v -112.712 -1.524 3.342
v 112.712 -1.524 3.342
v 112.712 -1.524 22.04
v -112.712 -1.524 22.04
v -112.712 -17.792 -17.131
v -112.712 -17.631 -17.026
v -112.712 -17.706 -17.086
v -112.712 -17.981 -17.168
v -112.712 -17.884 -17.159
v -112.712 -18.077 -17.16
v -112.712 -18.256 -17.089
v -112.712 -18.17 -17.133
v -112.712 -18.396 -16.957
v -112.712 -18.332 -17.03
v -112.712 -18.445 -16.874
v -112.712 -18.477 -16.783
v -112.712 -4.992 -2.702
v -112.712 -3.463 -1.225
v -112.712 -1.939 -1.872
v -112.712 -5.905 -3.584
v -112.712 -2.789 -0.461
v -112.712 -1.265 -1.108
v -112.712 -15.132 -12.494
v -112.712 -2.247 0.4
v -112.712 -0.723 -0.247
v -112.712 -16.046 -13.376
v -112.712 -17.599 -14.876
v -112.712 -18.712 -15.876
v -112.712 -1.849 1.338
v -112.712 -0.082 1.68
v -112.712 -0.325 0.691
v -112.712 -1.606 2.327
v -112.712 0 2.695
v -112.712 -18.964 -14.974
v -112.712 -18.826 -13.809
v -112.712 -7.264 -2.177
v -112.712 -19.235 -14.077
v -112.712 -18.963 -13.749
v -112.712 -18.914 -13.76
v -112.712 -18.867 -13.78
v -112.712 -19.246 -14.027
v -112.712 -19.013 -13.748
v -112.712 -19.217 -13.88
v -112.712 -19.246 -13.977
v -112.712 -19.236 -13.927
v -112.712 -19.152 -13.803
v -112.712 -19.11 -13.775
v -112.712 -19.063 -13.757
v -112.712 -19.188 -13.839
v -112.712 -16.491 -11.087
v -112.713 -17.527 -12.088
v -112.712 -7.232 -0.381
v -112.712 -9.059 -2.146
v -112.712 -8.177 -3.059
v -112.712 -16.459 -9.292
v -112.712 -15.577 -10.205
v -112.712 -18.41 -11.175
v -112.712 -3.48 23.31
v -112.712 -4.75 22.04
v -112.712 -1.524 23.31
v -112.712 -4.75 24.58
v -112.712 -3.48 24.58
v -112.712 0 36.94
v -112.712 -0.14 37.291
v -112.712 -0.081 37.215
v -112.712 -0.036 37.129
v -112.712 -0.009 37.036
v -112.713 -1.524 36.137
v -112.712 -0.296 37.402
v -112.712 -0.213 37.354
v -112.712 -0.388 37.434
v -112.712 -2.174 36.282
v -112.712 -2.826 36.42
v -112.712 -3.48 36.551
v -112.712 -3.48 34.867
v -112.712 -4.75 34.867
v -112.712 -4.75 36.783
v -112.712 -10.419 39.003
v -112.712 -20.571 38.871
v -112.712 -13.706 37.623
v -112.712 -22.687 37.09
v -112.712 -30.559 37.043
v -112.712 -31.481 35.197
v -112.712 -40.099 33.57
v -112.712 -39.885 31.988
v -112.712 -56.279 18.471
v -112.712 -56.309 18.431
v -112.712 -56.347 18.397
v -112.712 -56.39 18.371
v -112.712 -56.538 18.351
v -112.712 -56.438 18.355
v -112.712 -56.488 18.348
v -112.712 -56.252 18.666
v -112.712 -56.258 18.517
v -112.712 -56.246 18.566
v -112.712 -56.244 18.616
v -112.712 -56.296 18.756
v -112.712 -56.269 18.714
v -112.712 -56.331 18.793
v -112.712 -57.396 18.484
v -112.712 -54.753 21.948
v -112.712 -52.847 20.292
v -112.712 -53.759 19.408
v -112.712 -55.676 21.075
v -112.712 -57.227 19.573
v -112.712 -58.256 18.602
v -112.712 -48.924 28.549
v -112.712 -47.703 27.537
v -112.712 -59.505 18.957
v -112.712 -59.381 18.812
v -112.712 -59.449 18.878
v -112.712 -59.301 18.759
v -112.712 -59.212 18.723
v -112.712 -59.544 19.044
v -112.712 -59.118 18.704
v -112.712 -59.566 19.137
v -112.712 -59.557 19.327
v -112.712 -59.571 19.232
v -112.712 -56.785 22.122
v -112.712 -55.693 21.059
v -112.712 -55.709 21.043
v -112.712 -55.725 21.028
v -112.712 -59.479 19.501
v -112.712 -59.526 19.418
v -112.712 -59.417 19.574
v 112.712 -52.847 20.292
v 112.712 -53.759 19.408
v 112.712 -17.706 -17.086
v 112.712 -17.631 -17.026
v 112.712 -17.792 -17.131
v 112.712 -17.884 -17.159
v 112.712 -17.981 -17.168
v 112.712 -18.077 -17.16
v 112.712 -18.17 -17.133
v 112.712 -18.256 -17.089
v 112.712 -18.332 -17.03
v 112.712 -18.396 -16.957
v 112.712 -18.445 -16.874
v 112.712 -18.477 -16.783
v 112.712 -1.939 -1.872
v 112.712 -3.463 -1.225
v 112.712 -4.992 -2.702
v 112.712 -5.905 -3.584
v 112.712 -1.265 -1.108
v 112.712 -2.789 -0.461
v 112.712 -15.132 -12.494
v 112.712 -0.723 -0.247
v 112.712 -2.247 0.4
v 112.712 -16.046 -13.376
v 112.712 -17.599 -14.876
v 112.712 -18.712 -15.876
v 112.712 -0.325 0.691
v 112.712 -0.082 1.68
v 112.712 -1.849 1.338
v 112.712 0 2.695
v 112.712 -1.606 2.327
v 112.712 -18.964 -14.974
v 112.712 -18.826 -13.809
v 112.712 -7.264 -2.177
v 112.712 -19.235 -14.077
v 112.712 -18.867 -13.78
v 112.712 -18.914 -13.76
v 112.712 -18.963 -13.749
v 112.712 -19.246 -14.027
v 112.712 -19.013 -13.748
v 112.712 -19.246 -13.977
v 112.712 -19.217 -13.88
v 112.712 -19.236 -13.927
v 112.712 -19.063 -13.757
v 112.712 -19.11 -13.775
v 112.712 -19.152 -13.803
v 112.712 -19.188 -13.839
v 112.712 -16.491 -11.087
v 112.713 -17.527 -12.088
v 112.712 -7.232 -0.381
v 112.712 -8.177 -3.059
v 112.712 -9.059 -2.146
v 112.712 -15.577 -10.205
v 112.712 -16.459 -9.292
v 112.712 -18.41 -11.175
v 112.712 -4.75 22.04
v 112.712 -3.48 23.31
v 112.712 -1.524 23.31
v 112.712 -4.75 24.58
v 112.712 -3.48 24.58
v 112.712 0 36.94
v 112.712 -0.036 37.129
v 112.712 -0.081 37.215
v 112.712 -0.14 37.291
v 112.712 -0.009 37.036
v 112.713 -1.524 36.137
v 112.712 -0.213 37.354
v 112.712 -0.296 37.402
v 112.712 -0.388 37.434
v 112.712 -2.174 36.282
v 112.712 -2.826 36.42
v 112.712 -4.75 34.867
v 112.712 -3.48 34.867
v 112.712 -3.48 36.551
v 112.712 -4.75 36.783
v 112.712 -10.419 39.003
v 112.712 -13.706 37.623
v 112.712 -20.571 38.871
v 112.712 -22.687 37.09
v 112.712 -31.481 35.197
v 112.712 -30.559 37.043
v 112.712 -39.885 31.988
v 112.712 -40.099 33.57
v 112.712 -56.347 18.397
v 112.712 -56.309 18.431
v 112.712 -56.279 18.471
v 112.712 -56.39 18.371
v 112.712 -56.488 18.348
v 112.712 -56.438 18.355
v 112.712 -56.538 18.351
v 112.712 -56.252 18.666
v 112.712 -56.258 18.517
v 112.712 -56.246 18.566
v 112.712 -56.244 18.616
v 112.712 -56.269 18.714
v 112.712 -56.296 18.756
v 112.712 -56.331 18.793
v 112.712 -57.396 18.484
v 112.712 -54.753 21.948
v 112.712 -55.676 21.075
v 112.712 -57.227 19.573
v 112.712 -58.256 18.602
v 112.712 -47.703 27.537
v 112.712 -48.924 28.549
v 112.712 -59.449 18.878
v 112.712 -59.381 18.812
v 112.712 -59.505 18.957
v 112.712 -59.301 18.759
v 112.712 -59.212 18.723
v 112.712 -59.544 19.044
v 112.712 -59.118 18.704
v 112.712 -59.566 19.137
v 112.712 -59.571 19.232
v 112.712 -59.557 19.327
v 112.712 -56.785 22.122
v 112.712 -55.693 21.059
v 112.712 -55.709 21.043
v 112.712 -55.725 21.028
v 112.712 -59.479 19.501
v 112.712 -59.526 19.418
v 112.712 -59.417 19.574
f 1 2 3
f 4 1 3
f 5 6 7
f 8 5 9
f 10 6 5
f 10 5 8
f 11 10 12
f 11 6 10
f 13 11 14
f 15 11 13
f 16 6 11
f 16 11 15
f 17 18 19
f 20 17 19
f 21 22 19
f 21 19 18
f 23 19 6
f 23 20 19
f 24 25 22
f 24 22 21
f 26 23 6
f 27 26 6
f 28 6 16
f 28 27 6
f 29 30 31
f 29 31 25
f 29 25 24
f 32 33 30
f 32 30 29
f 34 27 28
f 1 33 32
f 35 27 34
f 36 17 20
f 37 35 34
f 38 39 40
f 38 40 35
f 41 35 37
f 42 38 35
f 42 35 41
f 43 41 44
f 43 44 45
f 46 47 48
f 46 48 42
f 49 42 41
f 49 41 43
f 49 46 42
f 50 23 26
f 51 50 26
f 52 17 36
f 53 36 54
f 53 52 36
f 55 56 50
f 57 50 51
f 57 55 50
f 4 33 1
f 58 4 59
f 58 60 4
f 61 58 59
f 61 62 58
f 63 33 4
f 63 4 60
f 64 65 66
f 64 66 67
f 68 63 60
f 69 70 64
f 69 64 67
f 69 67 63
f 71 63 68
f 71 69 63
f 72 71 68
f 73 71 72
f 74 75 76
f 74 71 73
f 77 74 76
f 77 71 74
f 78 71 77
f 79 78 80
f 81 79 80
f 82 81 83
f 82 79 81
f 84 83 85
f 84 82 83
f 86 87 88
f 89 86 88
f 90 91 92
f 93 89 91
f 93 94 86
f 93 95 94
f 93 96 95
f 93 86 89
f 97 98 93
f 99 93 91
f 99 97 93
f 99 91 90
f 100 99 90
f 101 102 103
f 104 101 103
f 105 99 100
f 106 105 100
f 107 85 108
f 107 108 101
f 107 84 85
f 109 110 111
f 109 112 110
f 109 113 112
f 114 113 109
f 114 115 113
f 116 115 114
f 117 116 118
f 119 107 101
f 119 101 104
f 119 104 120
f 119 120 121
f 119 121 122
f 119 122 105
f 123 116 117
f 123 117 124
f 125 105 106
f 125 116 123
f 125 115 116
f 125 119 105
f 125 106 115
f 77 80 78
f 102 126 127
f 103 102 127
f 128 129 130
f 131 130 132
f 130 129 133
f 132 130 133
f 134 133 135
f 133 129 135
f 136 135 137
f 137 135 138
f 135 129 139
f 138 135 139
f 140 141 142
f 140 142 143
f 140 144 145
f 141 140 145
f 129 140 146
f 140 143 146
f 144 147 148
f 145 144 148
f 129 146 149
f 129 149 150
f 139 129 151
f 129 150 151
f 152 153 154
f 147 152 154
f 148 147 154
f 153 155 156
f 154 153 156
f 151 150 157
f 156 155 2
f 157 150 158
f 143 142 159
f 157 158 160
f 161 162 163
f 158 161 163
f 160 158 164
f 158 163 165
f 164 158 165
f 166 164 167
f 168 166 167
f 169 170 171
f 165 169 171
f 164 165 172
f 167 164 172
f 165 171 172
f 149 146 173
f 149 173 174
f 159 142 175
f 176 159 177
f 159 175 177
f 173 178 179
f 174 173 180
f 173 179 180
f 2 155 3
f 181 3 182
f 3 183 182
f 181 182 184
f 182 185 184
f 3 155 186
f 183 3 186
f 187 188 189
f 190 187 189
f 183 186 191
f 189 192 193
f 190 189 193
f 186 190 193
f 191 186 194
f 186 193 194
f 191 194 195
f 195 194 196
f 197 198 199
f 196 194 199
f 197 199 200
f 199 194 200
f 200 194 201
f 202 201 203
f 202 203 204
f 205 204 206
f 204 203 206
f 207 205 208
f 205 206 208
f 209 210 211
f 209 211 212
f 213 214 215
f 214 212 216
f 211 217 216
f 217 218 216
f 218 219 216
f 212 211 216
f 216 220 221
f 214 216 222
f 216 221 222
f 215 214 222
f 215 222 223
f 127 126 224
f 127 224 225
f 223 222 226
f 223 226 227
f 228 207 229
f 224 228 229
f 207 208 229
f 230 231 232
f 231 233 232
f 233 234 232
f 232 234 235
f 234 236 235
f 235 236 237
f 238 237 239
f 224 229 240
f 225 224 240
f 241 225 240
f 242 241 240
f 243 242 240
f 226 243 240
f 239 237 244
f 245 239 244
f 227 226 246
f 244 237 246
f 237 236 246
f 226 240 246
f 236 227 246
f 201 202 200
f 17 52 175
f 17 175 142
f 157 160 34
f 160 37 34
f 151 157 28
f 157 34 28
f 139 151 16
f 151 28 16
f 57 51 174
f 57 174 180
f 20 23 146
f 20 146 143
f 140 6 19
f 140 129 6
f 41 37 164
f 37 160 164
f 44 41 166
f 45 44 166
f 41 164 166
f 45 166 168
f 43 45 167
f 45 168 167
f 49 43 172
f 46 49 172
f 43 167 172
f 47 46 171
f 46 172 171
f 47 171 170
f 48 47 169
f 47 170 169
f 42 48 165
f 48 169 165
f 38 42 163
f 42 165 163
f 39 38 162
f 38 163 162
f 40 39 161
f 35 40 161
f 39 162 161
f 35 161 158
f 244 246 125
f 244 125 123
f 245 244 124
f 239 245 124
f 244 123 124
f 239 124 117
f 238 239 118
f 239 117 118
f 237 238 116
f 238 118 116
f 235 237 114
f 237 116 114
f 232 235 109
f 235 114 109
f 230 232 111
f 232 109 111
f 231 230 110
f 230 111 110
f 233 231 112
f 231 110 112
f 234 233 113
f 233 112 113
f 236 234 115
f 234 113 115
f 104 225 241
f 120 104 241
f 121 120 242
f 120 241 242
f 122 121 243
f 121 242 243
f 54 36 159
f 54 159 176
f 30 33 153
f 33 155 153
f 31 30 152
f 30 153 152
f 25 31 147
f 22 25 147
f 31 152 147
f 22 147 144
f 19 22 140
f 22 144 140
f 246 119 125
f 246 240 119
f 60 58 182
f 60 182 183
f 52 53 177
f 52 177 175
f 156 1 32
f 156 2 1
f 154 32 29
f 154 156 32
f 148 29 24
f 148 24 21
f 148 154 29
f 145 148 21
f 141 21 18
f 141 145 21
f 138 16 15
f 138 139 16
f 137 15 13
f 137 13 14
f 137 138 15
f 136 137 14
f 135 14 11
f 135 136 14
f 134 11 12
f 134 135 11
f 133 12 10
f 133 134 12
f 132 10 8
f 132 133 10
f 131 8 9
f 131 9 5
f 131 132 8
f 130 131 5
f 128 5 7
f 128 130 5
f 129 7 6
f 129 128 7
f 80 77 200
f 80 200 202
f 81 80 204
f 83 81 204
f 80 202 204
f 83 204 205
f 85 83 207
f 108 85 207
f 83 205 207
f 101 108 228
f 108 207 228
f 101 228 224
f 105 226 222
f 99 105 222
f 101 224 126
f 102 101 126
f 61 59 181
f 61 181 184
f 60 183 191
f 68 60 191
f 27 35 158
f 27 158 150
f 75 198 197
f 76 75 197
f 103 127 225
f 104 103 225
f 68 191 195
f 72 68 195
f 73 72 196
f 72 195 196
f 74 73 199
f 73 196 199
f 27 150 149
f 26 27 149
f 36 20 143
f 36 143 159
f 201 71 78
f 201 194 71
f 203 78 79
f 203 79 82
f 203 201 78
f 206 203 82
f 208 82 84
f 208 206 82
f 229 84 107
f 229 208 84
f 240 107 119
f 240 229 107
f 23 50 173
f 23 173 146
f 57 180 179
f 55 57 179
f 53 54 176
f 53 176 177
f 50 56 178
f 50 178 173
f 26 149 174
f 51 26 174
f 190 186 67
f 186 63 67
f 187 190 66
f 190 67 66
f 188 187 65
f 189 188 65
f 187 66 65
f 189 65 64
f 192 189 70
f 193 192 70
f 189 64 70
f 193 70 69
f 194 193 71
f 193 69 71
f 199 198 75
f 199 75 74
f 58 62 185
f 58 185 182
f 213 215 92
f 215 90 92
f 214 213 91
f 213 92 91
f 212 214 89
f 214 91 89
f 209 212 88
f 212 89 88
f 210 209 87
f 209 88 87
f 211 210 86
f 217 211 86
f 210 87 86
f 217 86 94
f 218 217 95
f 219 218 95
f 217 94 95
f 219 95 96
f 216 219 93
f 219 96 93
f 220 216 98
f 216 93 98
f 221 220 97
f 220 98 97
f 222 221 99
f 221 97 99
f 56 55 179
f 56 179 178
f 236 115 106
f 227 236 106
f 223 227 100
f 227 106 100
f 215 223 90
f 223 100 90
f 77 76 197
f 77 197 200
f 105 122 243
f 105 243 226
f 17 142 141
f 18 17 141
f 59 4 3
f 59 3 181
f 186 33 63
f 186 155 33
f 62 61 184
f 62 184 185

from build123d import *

# Parameters (mm, degrees)
F1_DEPTH  = 112.7125
F2_T      = -1.524
F5_DEPTH  = 225.425
F7_DEPTH  = 225.425
F8_R      = 47.1235523983
F9_DEPTH  = 225.425
F14_W     = 1.27
F14_H     = 1.9164090636
F15_DEPTH = 225.425
F16_R     = 0.508
F17_R     = 6.35
F18_R     = 0.254


with BuildPart() as f1:
    # F0 (on Right) → F1 (new body, symmetric)
    with BuildSketch(Plane.YZ):
        with BuildLine():
            Line((-60.206202515, 18.8091920411), (-18.2712309286, -17.6443226097))
            Line((-18.2712309286, -17.6443226097), (0, 0))
            Line((0, 0), (0, 37.338))
            ThreePointArc((0, 37.338), (-30.365960448, 37.0950138966), (-56.7851466581, 22.1224658109))
            Line((-56.7851466581, 22.1224658109), (-60.206202515, 18.8091920411))
        make_face()
    extrude(amount=F1_DEPTH, both=True)

    # F2
    f2_openings = [f1.faces().sort_by_distance(p)[0] for p in [
        (0, -39.238717, 0.582435),
        (-112.7125, -23.858996, 15.007627),
        (112.7125, -23.858996, 15.007627),
    ]]
    offset(amount=F2_T, openings=f2_openings)

    # F4 (on face) → F5 (join, through all)
    with BuildSketch(Plane(origin=(-112.7125, 0, 0), x_dir=(0, -1, 0), z_dir=(-1, 0, 0))):
        Polygon((57.1348145041, 16.1392751765), (59.0517768379, 17.8056651102), (57.2272137142, 19.5727444541), (55.3102513804, 17.9063545204), align=None)
    extrude(amount=-F5_DEPTH)

    # F6 (on face) → F7 (join, through all)
    with BuildSketch(Plane(origin=(-112.7125, 0, 0), x_dir=(0, -1, 0), z_dir=(-1, 0, 0))):
        Polygon((19.5156410606, -13.2098472516), (17.5986787268, -14.8762371852), (19.4258018197, -16.6406694462), (21.3427641534, -14.9742795125), align=None)
    extrude(amount=-F7_DEPTH)

    # F8 (on face) → F9 (cut, through all)
    with BuildSketch(Plane(origin=(-112.7125, 0, 0), x_dir=(0, -1, 0), z_dir=(-1, 0, 0))):
        with Locations((64.2101801841, -28.1439479334)):
            Circle(F8_R)
    extrude(amount=-F9_DEPTH, mode=Mode.SUBTRACT)

    # F10 (on face) + F11 (on face) + F12 (on face) + F13 (on face) + F14 (on face) → F15 (join, through all)
    with BuildSketch(Plane(origin=(-112.7125, 0, 0), x_dir=(0, -1, 0), z_dir=(-1, 0, 0))):
        Polygon((15.1320625515, -12.4942536329), (16.0456240979, -13.3764697634), (17.5273234081, -12.0884482036), (16.4906753924, -11.0873688514), align=None)
    with BuildSketch(Plane(origin=(-112.7125, 0, 0), x_dir=(0, -1, 0), z_dir=(-1, 0, 0))):
        Polygon((15.577113846, -10.2051527209), (17.5273234081, -12.0884482036), (18.4095395386, -11.1748866572), (16.4593299765, -9.2915911745), align=None)
    with BuildSketch(Plane(origin=(-112.7125, 0, 0), x_dir=(0, -1, 0), z_dir=(-1, 0, 0))):
        Polygon((53.7593727252, 19.4083719627), (55.676335059, 21.0747618964), (54.7640534971, 21.9583015683), (52.8470911634, 20.2919116347), align=None)
    with BuildSketch(Plane(origin=(-112.7125, 0, 0), x_dir=(0, -1, 0), z_dir=(-1, 0, 0))):
        Polygon((4.9915293861, -2.7016545845), (5.9050909325, -3.583870715), (7.2637037735, -2.1769859335), (8.1772653199, -3.059202064), (9.0594814504, -2.1456405176), (7.2323583575, -0.3812082566), align=None)
    with BuildSketch(Plane(origin=(-112.7125, 0, 0), x_dir=(0, -1, 0), z_dir=(-1, 0, 0))):
        Polygon((1.524, 23.3097989494), (1.524, 22.0397989494), (4.7498, 22.0397989494), (4.7498, 24.5797989494), (3.4798, 24.5797989494), (3.4798, 23.3097989494), align=None)
        with Locations((4.1148, 35.8250034812)):
            Rectangle(F14_W, F14_H)
    extrude(amount=-F15_DEPTH)

    # F16
    f16_edges = [f1.edges().sort_by_distance(p)[0] for p in [
        (0, -18.271231, -17.644323),
        (0, -60.206203, 18.809192),
        (0, 0, 37.338),
    ]]
    fillet(f16_edges, radius=F16_R)

    # F17
    f17_edges = [f1.edges().sort_by_distance(p)[0] for p in [
        (0, -1.524, 0.6469),
        (0, 0, 0),
    ]]
    fillet(f17_edges, radius=F17_R)

    # F18
    f18_edges = [f1.edges().sort_by_distance(p)[0] for p in [
        (0, -19.515641, -13.209847),
        (0, -55.641079, 18.193938),
    ]]
    fillet(f18_edges, radius=F18_R)


solid = f1.part
